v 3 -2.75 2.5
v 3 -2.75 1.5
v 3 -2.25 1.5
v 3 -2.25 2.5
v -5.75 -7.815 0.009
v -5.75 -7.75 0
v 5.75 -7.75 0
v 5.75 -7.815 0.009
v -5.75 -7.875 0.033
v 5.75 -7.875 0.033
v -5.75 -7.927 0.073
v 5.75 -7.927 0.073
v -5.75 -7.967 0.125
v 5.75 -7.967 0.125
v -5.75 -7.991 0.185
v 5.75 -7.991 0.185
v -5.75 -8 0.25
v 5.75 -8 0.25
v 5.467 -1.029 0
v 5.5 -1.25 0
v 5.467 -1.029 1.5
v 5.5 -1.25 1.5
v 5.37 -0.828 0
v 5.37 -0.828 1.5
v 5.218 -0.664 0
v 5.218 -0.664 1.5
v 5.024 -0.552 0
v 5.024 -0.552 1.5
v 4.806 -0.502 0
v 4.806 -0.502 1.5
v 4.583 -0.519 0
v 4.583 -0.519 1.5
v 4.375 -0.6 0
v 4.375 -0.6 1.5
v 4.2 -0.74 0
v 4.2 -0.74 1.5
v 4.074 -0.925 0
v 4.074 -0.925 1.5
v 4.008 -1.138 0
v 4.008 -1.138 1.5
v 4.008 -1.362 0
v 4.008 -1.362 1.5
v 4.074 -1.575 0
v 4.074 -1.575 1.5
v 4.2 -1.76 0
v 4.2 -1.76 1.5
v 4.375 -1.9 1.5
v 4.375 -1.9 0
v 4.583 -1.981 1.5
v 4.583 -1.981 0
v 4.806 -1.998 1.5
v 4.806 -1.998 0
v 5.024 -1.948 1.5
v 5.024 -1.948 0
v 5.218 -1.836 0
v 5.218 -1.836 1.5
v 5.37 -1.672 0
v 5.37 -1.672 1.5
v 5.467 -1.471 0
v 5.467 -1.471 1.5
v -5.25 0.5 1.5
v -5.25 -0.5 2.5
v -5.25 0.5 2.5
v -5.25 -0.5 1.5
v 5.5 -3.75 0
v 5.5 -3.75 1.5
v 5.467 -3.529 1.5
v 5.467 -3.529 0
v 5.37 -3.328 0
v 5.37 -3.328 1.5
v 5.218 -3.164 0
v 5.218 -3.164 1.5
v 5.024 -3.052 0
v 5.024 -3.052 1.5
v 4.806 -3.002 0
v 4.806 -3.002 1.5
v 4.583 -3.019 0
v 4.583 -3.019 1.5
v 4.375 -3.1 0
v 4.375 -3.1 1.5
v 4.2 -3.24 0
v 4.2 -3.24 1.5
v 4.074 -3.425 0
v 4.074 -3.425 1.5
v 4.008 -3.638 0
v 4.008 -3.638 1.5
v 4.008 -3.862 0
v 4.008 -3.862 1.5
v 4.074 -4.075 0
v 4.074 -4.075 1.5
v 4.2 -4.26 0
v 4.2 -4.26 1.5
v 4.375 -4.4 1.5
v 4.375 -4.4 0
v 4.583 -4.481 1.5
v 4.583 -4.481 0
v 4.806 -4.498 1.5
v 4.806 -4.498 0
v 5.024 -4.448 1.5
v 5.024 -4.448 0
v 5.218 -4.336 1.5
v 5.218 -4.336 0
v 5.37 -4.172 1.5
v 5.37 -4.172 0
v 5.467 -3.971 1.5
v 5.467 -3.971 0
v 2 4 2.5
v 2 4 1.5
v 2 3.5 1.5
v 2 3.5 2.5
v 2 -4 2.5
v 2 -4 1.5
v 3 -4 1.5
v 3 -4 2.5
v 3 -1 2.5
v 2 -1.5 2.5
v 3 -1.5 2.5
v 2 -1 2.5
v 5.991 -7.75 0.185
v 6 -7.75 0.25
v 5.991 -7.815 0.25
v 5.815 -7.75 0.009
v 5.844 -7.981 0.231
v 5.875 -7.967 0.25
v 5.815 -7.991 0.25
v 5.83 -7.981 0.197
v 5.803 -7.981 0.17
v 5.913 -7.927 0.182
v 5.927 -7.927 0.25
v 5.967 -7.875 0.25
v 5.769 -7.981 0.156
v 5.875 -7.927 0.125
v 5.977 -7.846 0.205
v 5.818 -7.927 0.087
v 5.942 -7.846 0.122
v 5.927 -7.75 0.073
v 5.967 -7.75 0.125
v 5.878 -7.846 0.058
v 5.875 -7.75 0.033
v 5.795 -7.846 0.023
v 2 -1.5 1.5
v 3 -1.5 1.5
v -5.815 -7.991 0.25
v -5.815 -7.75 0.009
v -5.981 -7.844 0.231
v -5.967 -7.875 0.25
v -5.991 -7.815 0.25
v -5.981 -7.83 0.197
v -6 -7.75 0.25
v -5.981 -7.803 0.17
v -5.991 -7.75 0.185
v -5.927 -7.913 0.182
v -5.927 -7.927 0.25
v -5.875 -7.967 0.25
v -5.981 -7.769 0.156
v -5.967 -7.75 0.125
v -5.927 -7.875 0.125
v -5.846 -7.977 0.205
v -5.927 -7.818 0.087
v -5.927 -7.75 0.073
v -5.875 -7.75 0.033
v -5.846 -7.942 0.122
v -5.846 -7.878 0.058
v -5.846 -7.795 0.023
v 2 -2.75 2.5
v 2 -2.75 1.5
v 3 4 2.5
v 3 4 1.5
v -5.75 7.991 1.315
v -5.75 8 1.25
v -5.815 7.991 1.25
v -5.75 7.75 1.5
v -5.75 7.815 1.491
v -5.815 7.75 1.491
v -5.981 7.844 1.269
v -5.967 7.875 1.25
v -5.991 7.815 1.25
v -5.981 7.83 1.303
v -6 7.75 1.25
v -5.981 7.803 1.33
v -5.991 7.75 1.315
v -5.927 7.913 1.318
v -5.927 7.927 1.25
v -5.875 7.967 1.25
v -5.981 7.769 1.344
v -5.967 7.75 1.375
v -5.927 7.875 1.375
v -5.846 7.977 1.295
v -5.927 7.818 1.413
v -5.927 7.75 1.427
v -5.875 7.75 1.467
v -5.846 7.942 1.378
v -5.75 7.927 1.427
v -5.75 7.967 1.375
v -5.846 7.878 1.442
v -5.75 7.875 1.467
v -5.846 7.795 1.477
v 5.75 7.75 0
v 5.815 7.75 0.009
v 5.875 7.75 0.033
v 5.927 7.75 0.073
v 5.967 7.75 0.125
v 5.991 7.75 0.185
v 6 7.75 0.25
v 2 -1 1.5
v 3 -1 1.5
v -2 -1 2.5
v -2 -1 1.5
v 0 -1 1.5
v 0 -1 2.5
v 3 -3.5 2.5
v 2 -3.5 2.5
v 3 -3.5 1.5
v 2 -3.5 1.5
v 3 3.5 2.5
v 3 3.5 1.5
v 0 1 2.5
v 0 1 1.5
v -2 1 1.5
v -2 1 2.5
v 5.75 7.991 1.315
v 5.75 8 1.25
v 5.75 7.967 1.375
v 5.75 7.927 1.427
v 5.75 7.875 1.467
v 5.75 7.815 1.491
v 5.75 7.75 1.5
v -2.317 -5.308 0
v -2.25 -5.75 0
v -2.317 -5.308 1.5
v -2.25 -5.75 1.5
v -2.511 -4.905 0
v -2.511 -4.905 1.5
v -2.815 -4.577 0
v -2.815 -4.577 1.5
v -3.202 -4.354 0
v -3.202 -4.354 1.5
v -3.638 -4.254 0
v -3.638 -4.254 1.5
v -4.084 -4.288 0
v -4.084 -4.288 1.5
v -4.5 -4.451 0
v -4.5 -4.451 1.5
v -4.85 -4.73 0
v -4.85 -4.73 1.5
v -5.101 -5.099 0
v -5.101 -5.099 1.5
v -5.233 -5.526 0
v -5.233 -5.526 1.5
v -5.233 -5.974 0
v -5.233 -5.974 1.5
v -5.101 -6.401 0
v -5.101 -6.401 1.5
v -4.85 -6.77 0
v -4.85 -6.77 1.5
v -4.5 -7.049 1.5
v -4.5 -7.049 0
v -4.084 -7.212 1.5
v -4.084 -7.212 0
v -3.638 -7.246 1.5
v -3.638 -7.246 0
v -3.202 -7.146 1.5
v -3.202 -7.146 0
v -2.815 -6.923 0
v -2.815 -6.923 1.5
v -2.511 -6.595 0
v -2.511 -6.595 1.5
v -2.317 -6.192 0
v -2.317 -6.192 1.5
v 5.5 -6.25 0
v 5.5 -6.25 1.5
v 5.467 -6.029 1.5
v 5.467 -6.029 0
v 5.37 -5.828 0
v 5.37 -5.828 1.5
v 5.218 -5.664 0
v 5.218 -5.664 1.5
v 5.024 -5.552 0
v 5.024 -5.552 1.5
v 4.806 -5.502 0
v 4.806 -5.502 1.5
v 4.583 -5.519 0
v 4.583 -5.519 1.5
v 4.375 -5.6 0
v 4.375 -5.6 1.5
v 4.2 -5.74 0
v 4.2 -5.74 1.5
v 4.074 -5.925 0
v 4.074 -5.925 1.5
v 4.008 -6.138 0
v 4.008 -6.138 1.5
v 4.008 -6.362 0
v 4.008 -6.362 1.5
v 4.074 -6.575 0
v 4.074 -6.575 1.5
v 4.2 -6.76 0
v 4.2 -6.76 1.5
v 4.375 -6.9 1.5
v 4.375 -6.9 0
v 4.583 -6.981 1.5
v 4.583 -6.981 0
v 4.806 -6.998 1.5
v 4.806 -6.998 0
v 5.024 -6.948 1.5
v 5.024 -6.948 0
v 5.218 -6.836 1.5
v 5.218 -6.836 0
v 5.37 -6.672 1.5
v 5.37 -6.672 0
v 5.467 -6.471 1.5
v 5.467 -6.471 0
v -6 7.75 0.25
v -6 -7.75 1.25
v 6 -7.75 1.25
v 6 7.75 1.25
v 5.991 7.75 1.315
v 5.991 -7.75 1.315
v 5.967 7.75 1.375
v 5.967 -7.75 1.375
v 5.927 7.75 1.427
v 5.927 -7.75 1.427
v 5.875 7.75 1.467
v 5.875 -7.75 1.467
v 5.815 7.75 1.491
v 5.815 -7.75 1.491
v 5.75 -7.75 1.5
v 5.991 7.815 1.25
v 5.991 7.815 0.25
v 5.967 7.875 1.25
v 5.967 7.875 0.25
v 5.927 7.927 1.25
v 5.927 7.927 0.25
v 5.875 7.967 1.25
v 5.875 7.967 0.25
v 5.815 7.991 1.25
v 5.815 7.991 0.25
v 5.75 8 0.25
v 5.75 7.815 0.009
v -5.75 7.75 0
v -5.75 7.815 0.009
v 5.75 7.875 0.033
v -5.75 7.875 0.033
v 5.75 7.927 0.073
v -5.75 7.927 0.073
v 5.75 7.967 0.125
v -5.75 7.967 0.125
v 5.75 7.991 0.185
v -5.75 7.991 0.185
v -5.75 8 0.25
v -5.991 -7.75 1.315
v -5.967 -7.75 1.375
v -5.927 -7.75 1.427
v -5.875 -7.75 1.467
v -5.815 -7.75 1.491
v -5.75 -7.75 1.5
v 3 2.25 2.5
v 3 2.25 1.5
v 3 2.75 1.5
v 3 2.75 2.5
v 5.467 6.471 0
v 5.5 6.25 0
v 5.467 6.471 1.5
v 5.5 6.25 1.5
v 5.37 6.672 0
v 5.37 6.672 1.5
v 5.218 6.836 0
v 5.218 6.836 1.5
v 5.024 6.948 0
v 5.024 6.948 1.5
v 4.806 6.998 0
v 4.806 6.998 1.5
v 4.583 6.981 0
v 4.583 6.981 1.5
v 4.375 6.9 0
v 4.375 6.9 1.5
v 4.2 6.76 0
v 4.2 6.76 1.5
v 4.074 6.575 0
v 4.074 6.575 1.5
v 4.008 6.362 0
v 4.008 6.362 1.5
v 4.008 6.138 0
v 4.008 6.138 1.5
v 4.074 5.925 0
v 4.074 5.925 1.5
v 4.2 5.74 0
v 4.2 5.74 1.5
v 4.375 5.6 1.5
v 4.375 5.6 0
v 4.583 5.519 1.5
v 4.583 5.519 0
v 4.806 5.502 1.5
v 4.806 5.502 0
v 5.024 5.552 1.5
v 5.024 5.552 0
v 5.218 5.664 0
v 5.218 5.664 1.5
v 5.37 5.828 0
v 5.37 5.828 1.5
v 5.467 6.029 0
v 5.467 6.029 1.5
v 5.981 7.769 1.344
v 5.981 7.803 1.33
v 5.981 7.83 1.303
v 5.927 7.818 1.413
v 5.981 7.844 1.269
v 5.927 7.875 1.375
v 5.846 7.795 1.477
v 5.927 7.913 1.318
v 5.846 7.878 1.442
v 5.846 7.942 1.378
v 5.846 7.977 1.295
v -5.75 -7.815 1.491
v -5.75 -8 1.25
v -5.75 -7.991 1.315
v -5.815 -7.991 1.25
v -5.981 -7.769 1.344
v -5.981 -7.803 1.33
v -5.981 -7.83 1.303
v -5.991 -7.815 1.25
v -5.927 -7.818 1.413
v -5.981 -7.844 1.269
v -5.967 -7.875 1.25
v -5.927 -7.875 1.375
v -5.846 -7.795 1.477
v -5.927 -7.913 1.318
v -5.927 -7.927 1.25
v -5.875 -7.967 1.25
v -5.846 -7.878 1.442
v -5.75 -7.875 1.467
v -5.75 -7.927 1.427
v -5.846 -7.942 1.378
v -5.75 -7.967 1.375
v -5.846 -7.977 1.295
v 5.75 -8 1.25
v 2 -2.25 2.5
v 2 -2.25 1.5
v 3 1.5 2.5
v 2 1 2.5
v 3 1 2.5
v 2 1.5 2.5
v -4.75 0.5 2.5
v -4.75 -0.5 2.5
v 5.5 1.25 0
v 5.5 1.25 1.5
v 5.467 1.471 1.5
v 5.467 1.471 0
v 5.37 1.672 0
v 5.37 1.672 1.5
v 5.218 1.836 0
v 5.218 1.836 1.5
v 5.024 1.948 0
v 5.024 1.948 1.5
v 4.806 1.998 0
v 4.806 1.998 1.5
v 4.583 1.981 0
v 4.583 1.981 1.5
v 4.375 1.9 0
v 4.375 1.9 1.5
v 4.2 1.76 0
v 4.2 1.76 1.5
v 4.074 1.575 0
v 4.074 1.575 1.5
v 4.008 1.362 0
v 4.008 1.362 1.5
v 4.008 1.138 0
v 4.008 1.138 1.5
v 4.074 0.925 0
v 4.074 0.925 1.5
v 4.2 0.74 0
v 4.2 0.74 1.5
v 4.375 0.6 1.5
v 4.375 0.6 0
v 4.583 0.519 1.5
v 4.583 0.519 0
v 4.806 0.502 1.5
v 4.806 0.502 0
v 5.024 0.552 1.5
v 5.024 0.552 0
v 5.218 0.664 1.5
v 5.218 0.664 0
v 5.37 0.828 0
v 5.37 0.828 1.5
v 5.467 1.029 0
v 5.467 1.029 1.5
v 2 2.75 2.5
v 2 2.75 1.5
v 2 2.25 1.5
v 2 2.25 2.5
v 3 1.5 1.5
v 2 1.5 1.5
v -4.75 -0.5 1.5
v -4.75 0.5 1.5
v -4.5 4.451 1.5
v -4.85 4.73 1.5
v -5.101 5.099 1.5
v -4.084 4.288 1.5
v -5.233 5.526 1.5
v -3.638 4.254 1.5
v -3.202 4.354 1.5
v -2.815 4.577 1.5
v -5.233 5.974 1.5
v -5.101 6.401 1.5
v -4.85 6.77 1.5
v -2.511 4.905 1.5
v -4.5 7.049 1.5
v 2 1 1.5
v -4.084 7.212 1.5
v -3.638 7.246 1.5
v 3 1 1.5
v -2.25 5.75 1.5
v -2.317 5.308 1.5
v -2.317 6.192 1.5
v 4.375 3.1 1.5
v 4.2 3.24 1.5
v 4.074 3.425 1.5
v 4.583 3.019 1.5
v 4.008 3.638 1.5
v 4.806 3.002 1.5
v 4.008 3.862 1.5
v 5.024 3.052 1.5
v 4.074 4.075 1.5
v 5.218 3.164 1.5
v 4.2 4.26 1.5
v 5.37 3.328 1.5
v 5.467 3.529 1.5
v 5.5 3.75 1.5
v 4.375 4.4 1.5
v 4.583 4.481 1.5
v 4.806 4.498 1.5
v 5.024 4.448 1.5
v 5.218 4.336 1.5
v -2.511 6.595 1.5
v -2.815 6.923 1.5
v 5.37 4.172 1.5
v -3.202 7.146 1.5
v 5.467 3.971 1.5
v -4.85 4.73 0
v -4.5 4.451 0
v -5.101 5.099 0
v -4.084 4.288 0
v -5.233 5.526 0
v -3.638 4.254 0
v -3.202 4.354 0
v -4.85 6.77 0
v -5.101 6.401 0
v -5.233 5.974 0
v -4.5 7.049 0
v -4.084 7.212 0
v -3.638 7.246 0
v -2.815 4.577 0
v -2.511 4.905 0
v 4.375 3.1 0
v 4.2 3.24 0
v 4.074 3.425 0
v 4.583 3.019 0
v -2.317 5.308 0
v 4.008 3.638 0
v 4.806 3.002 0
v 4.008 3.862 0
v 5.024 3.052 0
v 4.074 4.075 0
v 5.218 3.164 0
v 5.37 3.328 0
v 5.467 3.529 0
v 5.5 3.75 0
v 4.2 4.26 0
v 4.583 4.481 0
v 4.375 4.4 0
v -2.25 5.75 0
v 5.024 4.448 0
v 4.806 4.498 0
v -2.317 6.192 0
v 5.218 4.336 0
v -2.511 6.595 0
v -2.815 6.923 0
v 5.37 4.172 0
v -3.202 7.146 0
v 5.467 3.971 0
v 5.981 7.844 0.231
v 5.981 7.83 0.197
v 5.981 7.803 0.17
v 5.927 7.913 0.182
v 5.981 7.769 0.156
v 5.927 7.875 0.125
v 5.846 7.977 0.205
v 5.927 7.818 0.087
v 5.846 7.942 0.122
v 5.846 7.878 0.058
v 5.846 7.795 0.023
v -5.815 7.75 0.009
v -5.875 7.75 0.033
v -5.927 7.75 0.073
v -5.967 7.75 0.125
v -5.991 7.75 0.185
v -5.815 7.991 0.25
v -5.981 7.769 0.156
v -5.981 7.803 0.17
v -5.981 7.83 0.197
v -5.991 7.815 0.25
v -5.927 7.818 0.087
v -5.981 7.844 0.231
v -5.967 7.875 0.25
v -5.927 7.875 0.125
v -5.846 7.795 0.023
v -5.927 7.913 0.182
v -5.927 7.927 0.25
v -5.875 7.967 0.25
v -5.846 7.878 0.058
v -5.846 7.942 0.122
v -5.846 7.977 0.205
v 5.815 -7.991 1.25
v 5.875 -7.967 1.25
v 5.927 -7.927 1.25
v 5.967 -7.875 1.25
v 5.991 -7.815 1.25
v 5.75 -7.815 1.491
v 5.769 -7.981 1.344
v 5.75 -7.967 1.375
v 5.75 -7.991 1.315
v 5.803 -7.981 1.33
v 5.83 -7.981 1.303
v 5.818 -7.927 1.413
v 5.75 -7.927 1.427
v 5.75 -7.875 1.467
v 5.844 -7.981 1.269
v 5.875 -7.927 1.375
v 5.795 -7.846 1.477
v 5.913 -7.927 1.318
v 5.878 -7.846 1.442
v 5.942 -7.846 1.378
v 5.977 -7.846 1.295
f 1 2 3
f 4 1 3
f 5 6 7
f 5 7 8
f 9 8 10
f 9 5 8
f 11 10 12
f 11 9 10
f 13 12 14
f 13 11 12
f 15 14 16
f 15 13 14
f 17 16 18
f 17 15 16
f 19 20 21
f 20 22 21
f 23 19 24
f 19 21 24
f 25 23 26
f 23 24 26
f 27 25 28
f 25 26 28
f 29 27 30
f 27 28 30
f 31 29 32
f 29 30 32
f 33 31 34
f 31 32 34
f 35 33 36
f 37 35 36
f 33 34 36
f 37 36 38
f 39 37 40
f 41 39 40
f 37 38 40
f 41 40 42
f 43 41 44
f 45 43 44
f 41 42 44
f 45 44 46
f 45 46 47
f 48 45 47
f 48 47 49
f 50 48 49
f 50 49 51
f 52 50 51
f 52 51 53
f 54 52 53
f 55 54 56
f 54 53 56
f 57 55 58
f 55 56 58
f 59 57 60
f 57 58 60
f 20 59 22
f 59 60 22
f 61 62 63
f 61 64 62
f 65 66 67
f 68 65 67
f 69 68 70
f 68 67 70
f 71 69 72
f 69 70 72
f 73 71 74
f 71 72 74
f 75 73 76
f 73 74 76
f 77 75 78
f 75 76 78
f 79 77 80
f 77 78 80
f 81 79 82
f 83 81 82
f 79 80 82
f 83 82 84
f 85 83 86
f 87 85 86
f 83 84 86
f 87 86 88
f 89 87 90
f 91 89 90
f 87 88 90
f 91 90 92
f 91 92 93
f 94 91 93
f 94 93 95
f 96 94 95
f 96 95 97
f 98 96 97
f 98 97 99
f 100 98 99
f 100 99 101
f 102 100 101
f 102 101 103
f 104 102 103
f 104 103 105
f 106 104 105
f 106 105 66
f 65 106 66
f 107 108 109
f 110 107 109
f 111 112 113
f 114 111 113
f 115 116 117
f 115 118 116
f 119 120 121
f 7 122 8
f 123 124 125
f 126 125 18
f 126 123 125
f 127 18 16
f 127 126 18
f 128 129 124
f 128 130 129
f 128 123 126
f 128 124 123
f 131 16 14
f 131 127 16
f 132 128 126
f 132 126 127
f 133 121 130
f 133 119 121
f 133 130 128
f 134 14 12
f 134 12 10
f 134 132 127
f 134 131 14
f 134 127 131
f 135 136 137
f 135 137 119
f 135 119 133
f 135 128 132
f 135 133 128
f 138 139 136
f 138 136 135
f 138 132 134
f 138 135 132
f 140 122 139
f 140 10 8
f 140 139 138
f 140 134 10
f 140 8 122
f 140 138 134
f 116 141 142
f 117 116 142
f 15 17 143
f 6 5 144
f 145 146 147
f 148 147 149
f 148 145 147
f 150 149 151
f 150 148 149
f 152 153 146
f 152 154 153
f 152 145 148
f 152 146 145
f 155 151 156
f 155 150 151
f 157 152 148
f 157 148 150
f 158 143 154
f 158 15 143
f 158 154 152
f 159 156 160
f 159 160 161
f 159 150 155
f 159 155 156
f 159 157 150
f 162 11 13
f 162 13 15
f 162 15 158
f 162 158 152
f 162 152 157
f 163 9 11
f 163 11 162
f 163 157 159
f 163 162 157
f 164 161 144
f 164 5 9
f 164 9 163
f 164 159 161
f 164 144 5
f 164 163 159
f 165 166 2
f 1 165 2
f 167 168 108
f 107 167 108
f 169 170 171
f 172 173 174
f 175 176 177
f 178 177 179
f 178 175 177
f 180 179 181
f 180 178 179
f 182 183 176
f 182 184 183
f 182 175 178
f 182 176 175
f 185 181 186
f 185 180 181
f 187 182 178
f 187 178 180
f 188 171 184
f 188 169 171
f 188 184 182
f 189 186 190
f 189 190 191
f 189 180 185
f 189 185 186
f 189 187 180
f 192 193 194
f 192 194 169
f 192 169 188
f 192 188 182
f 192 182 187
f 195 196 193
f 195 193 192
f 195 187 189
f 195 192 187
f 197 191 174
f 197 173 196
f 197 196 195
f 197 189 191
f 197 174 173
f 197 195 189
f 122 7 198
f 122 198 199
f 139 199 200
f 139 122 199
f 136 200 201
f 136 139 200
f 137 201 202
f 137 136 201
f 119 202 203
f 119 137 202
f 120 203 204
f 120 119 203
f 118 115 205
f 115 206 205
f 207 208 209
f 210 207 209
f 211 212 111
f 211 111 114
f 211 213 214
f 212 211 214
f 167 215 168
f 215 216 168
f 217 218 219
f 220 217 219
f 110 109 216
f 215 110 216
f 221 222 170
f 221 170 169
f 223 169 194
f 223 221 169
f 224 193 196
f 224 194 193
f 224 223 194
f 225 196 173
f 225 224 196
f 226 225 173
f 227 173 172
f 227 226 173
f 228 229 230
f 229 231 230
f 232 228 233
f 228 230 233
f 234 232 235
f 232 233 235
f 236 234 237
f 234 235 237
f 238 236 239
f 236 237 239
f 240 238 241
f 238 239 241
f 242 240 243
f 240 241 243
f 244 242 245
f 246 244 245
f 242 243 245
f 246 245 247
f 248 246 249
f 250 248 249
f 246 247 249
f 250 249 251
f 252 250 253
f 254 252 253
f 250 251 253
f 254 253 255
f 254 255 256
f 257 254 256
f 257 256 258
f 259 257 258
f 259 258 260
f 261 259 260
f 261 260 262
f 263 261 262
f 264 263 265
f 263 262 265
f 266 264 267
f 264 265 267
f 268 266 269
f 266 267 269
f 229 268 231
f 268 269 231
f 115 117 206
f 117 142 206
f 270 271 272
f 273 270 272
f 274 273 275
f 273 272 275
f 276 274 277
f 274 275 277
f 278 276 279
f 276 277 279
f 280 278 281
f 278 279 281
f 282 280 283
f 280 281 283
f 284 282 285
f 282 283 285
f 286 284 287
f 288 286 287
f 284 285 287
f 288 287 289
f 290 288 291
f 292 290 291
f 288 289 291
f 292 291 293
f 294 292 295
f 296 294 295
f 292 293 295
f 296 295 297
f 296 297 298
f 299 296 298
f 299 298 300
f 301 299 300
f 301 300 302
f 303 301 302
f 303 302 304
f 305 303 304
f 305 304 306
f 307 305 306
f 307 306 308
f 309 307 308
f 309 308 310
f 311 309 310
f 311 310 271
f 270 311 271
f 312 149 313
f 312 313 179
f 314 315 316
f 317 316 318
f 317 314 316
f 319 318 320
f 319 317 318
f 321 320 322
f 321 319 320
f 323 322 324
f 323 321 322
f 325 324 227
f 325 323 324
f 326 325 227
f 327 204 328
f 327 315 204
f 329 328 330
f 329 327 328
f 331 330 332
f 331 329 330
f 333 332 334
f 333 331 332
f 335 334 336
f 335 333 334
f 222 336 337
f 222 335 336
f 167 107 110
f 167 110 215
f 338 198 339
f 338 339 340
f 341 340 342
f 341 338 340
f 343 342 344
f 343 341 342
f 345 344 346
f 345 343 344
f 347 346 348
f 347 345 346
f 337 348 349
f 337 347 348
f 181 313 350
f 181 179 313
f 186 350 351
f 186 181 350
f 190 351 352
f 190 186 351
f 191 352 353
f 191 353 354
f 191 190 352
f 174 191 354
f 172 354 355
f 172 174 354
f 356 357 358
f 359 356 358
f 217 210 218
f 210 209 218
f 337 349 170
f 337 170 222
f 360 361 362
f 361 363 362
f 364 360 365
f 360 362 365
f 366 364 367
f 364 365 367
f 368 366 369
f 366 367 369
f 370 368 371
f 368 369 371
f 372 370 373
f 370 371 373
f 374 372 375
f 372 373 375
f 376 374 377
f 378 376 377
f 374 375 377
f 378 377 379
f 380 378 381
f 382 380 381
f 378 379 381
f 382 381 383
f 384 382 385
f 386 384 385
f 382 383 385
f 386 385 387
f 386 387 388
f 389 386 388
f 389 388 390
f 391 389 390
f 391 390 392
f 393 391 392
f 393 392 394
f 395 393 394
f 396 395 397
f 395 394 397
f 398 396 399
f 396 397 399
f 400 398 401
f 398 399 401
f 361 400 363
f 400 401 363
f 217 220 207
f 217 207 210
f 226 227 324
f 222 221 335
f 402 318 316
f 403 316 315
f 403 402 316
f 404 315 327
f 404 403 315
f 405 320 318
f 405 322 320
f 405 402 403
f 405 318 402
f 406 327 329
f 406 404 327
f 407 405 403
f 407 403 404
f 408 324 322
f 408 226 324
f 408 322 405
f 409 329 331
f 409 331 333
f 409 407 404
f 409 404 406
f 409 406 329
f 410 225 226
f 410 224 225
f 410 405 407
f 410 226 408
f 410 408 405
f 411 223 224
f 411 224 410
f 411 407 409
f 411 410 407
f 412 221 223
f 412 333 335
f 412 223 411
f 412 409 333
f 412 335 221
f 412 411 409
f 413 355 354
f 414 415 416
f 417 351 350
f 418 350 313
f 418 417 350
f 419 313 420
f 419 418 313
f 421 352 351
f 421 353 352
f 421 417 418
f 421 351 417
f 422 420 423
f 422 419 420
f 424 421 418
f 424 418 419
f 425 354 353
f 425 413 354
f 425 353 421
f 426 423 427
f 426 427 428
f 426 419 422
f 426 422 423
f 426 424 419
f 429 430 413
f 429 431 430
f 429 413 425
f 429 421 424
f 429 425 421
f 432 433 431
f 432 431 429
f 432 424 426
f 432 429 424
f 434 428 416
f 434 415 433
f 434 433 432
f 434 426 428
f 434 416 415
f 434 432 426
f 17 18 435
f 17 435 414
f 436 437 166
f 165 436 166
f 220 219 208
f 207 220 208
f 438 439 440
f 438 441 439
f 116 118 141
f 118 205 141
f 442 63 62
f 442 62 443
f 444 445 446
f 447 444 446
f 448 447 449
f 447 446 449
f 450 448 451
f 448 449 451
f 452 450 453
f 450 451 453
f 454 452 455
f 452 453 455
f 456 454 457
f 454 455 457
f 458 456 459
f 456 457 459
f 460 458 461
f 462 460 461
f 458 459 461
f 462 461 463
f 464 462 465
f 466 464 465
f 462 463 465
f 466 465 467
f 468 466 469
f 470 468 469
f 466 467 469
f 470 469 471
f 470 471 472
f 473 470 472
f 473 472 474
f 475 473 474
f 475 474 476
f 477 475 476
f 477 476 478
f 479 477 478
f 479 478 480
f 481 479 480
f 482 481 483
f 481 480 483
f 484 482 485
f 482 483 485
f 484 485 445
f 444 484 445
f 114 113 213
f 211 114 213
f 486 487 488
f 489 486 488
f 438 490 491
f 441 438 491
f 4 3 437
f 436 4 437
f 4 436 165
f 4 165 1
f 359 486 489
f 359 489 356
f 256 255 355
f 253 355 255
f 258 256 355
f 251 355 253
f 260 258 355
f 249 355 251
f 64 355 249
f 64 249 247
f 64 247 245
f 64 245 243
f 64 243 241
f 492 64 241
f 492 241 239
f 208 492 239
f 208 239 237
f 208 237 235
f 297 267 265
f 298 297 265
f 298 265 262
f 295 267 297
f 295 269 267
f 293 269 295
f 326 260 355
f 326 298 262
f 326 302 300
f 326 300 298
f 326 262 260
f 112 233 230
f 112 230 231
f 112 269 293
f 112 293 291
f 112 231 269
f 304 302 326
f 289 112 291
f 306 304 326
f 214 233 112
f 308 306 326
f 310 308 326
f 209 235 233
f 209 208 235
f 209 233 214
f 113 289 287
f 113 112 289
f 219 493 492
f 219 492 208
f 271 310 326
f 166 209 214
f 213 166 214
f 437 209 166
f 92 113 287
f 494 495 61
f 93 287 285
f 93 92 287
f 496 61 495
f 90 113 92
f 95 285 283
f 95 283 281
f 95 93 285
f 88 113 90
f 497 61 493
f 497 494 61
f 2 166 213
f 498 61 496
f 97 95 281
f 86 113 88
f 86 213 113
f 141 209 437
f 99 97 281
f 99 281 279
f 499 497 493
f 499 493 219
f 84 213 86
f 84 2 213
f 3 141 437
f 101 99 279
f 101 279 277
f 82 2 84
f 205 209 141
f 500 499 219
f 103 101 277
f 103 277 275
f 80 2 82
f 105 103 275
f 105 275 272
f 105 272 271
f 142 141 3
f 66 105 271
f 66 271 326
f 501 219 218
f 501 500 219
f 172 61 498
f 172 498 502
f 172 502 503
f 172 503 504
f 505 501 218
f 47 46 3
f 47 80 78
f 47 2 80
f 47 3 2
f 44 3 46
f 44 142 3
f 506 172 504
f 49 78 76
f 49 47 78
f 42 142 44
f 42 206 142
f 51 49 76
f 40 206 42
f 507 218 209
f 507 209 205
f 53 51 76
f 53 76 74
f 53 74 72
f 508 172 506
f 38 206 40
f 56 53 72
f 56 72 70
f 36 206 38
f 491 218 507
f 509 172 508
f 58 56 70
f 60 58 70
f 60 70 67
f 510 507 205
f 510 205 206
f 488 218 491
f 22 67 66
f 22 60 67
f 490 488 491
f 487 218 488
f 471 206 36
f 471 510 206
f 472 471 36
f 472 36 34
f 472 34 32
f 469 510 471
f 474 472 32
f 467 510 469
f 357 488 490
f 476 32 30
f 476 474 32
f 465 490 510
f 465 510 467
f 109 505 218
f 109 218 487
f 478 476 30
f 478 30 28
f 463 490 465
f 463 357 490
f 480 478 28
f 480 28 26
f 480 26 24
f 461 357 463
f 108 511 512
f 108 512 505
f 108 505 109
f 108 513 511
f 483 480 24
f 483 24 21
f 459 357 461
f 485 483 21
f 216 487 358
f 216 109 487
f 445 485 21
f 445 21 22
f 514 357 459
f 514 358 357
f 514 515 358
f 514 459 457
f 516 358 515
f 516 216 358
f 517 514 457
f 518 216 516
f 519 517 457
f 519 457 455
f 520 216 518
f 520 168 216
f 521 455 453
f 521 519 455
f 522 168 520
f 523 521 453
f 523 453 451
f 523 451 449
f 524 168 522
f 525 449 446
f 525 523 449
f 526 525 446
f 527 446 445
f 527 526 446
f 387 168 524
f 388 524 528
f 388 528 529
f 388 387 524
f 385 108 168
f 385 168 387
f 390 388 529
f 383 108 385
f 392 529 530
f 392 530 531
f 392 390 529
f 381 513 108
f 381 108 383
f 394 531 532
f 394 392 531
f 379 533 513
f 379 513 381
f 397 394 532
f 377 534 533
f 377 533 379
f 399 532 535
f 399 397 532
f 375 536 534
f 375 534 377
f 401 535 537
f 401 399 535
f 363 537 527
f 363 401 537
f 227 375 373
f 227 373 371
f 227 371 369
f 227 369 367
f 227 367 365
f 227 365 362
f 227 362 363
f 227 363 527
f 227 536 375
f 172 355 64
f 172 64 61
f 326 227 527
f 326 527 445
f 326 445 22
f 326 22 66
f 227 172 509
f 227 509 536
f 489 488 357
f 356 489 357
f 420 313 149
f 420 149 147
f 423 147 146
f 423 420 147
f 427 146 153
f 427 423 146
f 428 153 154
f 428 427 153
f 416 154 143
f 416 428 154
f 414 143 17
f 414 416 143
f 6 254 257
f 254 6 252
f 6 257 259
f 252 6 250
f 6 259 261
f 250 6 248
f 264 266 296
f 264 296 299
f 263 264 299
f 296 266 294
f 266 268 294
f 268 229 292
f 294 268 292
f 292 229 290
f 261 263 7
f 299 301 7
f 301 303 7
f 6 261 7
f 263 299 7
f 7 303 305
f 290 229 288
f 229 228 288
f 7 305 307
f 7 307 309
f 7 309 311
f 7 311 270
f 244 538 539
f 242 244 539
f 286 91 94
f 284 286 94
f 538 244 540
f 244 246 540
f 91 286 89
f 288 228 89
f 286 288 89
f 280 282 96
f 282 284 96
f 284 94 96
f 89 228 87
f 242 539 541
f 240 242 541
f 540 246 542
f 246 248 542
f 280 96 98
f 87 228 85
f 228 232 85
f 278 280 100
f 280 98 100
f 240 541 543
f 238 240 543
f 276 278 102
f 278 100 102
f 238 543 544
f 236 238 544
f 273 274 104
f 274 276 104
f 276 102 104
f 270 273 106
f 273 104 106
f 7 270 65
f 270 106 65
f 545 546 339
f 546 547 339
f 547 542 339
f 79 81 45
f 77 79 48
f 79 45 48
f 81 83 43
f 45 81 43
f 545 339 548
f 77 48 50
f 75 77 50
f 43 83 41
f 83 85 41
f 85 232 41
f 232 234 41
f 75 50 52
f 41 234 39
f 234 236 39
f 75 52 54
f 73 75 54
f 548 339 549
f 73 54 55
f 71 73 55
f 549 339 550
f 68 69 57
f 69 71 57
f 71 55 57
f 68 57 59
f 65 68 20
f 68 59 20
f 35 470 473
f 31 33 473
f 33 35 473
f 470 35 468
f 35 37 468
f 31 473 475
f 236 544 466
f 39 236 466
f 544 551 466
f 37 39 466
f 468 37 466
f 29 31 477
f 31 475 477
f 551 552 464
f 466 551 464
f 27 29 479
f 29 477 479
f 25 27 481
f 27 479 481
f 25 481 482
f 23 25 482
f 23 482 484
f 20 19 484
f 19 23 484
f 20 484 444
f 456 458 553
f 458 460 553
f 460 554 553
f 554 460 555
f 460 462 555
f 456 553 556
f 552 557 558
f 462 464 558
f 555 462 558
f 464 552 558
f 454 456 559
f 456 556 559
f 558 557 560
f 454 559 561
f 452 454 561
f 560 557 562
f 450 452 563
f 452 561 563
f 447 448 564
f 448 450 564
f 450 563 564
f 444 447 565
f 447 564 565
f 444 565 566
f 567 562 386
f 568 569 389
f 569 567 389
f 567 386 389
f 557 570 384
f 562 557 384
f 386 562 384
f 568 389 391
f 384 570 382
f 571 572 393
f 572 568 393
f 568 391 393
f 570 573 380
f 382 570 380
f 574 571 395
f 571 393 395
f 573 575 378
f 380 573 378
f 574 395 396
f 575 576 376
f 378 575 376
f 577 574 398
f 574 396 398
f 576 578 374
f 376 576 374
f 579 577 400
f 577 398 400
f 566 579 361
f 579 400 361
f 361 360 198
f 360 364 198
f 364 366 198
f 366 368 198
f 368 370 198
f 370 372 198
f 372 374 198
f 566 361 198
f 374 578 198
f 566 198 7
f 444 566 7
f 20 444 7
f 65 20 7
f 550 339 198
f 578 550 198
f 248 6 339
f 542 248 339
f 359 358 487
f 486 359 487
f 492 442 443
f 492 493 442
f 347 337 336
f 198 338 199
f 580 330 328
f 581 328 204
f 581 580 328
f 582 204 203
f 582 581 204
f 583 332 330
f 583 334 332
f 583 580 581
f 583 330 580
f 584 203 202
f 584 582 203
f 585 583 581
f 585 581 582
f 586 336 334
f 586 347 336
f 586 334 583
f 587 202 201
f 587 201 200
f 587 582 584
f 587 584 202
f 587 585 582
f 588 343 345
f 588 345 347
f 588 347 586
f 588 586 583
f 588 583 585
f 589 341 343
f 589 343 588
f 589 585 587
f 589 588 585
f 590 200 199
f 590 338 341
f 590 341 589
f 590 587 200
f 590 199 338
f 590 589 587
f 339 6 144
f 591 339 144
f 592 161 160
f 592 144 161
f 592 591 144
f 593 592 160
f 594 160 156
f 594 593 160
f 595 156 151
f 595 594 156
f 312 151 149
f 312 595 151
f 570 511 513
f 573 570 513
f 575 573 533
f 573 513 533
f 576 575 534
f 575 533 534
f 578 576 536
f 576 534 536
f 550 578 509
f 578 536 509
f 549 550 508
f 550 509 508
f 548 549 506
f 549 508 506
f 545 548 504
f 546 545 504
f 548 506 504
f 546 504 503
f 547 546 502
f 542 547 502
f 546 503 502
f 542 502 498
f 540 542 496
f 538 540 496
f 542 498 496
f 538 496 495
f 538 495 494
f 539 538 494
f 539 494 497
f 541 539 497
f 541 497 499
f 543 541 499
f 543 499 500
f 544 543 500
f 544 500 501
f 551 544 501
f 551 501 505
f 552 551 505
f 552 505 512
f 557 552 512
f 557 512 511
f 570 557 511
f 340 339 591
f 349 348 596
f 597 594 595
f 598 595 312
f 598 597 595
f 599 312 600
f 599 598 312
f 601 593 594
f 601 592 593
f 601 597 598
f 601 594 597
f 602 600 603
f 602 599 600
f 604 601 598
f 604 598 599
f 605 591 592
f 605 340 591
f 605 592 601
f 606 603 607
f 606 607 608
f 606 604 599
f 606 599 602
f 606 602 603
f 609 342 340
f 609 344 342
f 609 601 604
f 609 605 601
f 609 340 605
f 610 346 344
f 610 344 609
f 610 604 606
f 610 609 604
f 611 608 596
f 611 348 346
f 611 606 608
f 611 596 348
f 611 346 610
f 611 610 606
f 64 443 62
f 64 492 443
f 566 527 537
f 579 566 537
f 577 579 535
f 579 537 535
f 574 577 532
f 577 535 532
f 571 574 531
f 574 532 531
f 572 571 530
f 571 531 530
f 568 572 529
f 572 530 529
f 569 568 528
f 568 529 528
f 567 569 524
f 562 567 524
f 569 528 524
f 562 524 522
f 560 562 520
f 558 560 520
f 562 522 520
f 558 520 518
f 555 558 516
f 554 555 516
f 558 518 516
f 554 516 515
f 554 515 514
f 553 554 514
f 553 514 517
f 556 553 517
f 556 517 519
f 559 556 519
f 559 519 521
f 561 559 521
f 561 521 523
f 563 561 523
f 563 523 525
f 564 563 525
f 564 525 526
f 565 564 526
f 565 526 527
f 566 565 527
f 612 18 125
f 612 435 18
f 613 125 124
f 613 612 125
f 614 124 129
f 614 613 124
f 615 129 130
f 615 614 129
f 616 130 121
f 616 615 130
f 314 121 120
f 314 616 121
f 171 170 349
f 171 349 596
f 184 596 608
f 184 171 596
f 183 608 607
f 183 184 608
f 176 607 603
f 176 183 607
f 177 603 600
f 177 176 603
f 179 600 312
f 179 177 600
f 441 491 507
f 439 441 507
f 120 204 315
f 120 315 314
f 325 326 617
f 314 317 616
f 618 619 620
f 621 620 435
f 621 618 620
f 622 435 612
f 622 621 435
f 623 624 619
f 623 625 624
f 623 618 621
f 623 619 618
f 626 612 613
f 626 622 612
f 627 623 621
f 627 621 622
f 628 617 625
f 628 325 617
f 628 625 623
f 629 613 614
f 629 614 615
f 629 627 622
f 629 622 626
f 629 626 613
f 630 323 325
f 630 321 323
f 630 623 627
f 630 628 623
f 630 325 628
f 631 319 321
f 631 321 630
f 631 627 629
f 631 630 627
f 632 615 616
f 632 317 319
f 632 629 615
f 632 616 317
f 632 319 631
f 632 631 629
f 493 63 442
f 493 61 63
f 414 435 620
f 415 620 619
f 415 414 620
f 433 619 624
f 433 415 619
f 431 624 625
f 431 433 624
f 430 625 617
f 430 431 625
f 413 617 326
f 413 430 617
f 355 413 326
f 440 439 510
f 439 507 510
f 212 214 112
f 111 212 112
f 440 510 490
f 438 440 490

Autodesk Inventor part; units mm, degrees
ref_plane "YZ Plane" through (0, 0, 0) normal (1, 0, 0) x (0, 1, 0)
ref_plane "XZ Plane" through (0, 0, 0) normal (0, 1, 0) x (-1, 0, 0)
ref_plane "XY Plane" through (0, 0, 0) normal (0, 0, 1) x (1, 0, 0)
sketch "Szkic1" plane through (0, 0, 0) normal (0, 0, 1) x (1, 0, 0)
  point P0 (0, 0)
sketch "Szkic2" plane through (0, 0, 0) normal (0, 0, 1) x (1, 0, 0)
  line L0 (6, -8) -> (-6, -8)
  line L1 (-6, -8) -> (-6, 8)
  line L2 (-6, 8) -> (6, 8)
  line L3 (6, 8) -> (6, -8)
  line L4 (6, -8) -> (-6, 8) construction
  line L5 (-6, -8) -> (6, 8) construction
  point P0 (0, 0)
  dimension "d0" = 12
  dimension "d1" = 16
extrude "Wyciągnięcie proste1" add sketch "Szkic2" along normal blind 1.5
fillet "Zaokrąglenie1" radius 0.25 12 edges at (0, 8, 1.5) (0, 8, 0) (6, 0, 1.5) (6, 0, 0) (0, -8, 1.5) (0, -8, 0) (6, -8, 0.75) (6, 8, 0.75) (-6, 0, 1.5) (-6, 0, 0) (-6, -8, 0.75) (-6, 8, 0.75)
sketch "Szkic3" plane through (0, 0, 1.5) normal (0, 0, 1) x (1, 0, 0)
  line L0 (-5.75, -7.75) -> (-5.75, 7.75) projected
  line L1 (-5.75, -7.75) -> (-3.75, -7.75)
  line L2 (5.75, -7.75) -> (-5.75, -7.75) projected
  line L3 (-3.75, -7.75) -> (-3.75, -5.75)
  line L4 (-5.75, 7.75) -> (5.75, 7.75) projected
  line L5 (-5.75, 7.75) -> (-3.75, 7.75)
  line L6 (-3.75, 7.75) -> (-3.75, 5.75)
  line L7 (5.75, 7.75) -> (4.75, 7.75)
  line L8 (4.75, 7.75) -> (4.75, 6.25)
  line L9 (4.75, 6.25) -> (4.75, 3.75)
  line L10 (4.75, 3.75) -> (4.75, 1.25)
  line L11 (4.75, 1.25) -> (4.75, -1.25)
  line L12 (4.75, -1.25) -> (4.75, -3.75)
  line L13 (4.75, -3.75) -> (4.75, -6.25)
  circle A0 centre (-3.75, 5.75) radius 1.5
  circle A1 centre (-3.75, -5.75) radius 1.5
  circle A2 centre (4.75, -6.25) radius 0.5
  circle A3 centre (4.75, -3.75) radius 0.75
  circle A4 centre (4.75, -6.25) radius 0.75
  circle A5 centre (4.75, -1.25) radius 0.75
  circle A6 centre (4.75, 1.25) radius 0.75
  circle A7 centre (4.75, 3.75) radius 0.75
  circle A8 centre (4.75, 6.25) radius 0.75
  point P0 (0, 0)
  dimension "d5" = 2
  dimension "d6" = 2
  dimension "d7" = 2
  dimension "d8" = 2
  dimension "d9" = 1
  dimension "d10" = 1.5
  dimension "d11" = 2.5
  dimension "d12" = 2.5
  dimension "d13" = 2.5
  dimension "d14" = 2.5
  dimension "d15" = 2.5
  dimension "d17" = 3
  dimension "d18" = 3
  dimension "d19" = 1
  dimension "d20" = 1.5
  dimension "d21" = 1.5
  dimension "d22" = 1.5
  dimension "d23" = 1.5
  dimension "d24" = 1.5
  dimension "d25" = 1.5
extrude "Wyciągnięcie proste2" cut sketch "Szkic3" against normal blind 1.5 contours A2 | A4 | A3 L13 L12 | L12 L13 A3 | A5 L12 L11 | L11 L12 A5 | A6 L11 L10 | L10 L11 A6 | A7 L10 L9 | L9 L10 A7 | A8 L9 L8 | L8 L9 A8 | A0 | A1
sketch "Szkic4" plane through (0, 0, 1.5) normal (0, 0, 1) x (1, 0, 0)
  line L0 (3, -3.5) -> (2, -3.5)
  line L1 (2, -3.5) -> (2, -4)
  line L2 (2, -4) -> (3, -4)
  line L3 (3, -4) -> (3, -3.5)
  line L4 (3, -3.5) -> (2, -4) construction
  line L5 (2, -3.5) -> (3, -4) construction
  line L6 (3, -2.25) -> (2, -2.25)
  line L7 (2, -2.25) -> (2, -2.75)
  line L8 (2, -2.75) -> (3, -2.75)
  line L9 (3, -2.75) -> (3, -2.25)
  line L10 (3, -2.25) -> (2, -2.75) construction
  line L11 (2, -2.25) -> (3, -2.75) construction
  line L12 (3, -1) -> (2, -1)
  line L13 (2, -1) -> (2, -1.5)
  line L14 (2, -1.5) -> (3, -1.5)
  line L15 (3, -1.5) -> (3, -1)
  line L16 (3, -1) -> (2, -1.5) construction
  line L17 (2, -1) -> (3, -1.5) construction
  line L18 (3, 1.5) -> (2, 1.5)
  line L19 (2, 1.5) -> (2, 1)
  line L20 (2, 1) -> (3, 1)
  line L21 (3, 1) -> (3, 1.5)
  line L22 (3, 1.5) -> (2, 1) construction
  line L23 (2, 1.5) -> (3, 1) construction
  line L24 (3, 2.75) -> (2, 2.75)
  line L25 (2, 2.75) -> (2, 2.25)
  line L26 (2, 2.25) -> (3, 2.25)
  line L27 (3, 2.25) -> (3, 2.75)
  line L28 (3, 2.75) -> (2, 2.25) construction
  line L29 (2, 2.75) -> (3, 2.25) construction
  line L30 (3, 4) -> (2, 4)
  line L31 (2, 4) -> (2, 3.5)
  line L32 (2, 3.5) -> (3, 3.5)
  line L33 (3, 3.5) -> (3, 4)
  line L34 (3, 4) -> (2, 3.5) construction
  line L35 (2, 4) -> (3, 3.5) construction
  line L36 (-2, -1) -> (0, -1)
  line L37 (0, -1) -> (0, 1)
  line L38 (0, 1) -> (-2, 1)
  line L39 (-2, 1) -> (-2, -1)
  line L40 (-2, -1) -> (0, 1) construction
  line L41 (0, -1) -> (-2, 1) construction
  line L42 (-4.75, -0.5) -> (-5.25, -0.5)
  line L43 (-5.25, -0.5) -> (-5.25, 0.5)
  line L44 (-5.25, 0.5) -> (-4.75, 0.5)
  line L45 (-4.75, 0.5) -> (-4.75, -0.5)
  line L46 (-4.75, -0.5) -> (-5.25, 0.5) construction
  line L47 (-5.25, -0.5) -> (-4.75, 0.5) construction
  point P0 (0, 0)
  point P1 (2.5, -3.75)
  point P2 (2.5, -2.5)
  point P3 (2.5, -1.25)
  point P4 (2.5, 1.25)
  point P5 (2.5, 2.5)
  point P6 (2.5, 3.75)
  point P7 (-1, 0)
  point P8 (-5, 0)
  dimension "d28" = 1
  dimension "d29" = 0.5
  dimension "d30" = 1
extrude "Wyciągnięcie proste3" add sketch "Szkic4" along normal blind 1
properties part number "Czujnik BMP280"
